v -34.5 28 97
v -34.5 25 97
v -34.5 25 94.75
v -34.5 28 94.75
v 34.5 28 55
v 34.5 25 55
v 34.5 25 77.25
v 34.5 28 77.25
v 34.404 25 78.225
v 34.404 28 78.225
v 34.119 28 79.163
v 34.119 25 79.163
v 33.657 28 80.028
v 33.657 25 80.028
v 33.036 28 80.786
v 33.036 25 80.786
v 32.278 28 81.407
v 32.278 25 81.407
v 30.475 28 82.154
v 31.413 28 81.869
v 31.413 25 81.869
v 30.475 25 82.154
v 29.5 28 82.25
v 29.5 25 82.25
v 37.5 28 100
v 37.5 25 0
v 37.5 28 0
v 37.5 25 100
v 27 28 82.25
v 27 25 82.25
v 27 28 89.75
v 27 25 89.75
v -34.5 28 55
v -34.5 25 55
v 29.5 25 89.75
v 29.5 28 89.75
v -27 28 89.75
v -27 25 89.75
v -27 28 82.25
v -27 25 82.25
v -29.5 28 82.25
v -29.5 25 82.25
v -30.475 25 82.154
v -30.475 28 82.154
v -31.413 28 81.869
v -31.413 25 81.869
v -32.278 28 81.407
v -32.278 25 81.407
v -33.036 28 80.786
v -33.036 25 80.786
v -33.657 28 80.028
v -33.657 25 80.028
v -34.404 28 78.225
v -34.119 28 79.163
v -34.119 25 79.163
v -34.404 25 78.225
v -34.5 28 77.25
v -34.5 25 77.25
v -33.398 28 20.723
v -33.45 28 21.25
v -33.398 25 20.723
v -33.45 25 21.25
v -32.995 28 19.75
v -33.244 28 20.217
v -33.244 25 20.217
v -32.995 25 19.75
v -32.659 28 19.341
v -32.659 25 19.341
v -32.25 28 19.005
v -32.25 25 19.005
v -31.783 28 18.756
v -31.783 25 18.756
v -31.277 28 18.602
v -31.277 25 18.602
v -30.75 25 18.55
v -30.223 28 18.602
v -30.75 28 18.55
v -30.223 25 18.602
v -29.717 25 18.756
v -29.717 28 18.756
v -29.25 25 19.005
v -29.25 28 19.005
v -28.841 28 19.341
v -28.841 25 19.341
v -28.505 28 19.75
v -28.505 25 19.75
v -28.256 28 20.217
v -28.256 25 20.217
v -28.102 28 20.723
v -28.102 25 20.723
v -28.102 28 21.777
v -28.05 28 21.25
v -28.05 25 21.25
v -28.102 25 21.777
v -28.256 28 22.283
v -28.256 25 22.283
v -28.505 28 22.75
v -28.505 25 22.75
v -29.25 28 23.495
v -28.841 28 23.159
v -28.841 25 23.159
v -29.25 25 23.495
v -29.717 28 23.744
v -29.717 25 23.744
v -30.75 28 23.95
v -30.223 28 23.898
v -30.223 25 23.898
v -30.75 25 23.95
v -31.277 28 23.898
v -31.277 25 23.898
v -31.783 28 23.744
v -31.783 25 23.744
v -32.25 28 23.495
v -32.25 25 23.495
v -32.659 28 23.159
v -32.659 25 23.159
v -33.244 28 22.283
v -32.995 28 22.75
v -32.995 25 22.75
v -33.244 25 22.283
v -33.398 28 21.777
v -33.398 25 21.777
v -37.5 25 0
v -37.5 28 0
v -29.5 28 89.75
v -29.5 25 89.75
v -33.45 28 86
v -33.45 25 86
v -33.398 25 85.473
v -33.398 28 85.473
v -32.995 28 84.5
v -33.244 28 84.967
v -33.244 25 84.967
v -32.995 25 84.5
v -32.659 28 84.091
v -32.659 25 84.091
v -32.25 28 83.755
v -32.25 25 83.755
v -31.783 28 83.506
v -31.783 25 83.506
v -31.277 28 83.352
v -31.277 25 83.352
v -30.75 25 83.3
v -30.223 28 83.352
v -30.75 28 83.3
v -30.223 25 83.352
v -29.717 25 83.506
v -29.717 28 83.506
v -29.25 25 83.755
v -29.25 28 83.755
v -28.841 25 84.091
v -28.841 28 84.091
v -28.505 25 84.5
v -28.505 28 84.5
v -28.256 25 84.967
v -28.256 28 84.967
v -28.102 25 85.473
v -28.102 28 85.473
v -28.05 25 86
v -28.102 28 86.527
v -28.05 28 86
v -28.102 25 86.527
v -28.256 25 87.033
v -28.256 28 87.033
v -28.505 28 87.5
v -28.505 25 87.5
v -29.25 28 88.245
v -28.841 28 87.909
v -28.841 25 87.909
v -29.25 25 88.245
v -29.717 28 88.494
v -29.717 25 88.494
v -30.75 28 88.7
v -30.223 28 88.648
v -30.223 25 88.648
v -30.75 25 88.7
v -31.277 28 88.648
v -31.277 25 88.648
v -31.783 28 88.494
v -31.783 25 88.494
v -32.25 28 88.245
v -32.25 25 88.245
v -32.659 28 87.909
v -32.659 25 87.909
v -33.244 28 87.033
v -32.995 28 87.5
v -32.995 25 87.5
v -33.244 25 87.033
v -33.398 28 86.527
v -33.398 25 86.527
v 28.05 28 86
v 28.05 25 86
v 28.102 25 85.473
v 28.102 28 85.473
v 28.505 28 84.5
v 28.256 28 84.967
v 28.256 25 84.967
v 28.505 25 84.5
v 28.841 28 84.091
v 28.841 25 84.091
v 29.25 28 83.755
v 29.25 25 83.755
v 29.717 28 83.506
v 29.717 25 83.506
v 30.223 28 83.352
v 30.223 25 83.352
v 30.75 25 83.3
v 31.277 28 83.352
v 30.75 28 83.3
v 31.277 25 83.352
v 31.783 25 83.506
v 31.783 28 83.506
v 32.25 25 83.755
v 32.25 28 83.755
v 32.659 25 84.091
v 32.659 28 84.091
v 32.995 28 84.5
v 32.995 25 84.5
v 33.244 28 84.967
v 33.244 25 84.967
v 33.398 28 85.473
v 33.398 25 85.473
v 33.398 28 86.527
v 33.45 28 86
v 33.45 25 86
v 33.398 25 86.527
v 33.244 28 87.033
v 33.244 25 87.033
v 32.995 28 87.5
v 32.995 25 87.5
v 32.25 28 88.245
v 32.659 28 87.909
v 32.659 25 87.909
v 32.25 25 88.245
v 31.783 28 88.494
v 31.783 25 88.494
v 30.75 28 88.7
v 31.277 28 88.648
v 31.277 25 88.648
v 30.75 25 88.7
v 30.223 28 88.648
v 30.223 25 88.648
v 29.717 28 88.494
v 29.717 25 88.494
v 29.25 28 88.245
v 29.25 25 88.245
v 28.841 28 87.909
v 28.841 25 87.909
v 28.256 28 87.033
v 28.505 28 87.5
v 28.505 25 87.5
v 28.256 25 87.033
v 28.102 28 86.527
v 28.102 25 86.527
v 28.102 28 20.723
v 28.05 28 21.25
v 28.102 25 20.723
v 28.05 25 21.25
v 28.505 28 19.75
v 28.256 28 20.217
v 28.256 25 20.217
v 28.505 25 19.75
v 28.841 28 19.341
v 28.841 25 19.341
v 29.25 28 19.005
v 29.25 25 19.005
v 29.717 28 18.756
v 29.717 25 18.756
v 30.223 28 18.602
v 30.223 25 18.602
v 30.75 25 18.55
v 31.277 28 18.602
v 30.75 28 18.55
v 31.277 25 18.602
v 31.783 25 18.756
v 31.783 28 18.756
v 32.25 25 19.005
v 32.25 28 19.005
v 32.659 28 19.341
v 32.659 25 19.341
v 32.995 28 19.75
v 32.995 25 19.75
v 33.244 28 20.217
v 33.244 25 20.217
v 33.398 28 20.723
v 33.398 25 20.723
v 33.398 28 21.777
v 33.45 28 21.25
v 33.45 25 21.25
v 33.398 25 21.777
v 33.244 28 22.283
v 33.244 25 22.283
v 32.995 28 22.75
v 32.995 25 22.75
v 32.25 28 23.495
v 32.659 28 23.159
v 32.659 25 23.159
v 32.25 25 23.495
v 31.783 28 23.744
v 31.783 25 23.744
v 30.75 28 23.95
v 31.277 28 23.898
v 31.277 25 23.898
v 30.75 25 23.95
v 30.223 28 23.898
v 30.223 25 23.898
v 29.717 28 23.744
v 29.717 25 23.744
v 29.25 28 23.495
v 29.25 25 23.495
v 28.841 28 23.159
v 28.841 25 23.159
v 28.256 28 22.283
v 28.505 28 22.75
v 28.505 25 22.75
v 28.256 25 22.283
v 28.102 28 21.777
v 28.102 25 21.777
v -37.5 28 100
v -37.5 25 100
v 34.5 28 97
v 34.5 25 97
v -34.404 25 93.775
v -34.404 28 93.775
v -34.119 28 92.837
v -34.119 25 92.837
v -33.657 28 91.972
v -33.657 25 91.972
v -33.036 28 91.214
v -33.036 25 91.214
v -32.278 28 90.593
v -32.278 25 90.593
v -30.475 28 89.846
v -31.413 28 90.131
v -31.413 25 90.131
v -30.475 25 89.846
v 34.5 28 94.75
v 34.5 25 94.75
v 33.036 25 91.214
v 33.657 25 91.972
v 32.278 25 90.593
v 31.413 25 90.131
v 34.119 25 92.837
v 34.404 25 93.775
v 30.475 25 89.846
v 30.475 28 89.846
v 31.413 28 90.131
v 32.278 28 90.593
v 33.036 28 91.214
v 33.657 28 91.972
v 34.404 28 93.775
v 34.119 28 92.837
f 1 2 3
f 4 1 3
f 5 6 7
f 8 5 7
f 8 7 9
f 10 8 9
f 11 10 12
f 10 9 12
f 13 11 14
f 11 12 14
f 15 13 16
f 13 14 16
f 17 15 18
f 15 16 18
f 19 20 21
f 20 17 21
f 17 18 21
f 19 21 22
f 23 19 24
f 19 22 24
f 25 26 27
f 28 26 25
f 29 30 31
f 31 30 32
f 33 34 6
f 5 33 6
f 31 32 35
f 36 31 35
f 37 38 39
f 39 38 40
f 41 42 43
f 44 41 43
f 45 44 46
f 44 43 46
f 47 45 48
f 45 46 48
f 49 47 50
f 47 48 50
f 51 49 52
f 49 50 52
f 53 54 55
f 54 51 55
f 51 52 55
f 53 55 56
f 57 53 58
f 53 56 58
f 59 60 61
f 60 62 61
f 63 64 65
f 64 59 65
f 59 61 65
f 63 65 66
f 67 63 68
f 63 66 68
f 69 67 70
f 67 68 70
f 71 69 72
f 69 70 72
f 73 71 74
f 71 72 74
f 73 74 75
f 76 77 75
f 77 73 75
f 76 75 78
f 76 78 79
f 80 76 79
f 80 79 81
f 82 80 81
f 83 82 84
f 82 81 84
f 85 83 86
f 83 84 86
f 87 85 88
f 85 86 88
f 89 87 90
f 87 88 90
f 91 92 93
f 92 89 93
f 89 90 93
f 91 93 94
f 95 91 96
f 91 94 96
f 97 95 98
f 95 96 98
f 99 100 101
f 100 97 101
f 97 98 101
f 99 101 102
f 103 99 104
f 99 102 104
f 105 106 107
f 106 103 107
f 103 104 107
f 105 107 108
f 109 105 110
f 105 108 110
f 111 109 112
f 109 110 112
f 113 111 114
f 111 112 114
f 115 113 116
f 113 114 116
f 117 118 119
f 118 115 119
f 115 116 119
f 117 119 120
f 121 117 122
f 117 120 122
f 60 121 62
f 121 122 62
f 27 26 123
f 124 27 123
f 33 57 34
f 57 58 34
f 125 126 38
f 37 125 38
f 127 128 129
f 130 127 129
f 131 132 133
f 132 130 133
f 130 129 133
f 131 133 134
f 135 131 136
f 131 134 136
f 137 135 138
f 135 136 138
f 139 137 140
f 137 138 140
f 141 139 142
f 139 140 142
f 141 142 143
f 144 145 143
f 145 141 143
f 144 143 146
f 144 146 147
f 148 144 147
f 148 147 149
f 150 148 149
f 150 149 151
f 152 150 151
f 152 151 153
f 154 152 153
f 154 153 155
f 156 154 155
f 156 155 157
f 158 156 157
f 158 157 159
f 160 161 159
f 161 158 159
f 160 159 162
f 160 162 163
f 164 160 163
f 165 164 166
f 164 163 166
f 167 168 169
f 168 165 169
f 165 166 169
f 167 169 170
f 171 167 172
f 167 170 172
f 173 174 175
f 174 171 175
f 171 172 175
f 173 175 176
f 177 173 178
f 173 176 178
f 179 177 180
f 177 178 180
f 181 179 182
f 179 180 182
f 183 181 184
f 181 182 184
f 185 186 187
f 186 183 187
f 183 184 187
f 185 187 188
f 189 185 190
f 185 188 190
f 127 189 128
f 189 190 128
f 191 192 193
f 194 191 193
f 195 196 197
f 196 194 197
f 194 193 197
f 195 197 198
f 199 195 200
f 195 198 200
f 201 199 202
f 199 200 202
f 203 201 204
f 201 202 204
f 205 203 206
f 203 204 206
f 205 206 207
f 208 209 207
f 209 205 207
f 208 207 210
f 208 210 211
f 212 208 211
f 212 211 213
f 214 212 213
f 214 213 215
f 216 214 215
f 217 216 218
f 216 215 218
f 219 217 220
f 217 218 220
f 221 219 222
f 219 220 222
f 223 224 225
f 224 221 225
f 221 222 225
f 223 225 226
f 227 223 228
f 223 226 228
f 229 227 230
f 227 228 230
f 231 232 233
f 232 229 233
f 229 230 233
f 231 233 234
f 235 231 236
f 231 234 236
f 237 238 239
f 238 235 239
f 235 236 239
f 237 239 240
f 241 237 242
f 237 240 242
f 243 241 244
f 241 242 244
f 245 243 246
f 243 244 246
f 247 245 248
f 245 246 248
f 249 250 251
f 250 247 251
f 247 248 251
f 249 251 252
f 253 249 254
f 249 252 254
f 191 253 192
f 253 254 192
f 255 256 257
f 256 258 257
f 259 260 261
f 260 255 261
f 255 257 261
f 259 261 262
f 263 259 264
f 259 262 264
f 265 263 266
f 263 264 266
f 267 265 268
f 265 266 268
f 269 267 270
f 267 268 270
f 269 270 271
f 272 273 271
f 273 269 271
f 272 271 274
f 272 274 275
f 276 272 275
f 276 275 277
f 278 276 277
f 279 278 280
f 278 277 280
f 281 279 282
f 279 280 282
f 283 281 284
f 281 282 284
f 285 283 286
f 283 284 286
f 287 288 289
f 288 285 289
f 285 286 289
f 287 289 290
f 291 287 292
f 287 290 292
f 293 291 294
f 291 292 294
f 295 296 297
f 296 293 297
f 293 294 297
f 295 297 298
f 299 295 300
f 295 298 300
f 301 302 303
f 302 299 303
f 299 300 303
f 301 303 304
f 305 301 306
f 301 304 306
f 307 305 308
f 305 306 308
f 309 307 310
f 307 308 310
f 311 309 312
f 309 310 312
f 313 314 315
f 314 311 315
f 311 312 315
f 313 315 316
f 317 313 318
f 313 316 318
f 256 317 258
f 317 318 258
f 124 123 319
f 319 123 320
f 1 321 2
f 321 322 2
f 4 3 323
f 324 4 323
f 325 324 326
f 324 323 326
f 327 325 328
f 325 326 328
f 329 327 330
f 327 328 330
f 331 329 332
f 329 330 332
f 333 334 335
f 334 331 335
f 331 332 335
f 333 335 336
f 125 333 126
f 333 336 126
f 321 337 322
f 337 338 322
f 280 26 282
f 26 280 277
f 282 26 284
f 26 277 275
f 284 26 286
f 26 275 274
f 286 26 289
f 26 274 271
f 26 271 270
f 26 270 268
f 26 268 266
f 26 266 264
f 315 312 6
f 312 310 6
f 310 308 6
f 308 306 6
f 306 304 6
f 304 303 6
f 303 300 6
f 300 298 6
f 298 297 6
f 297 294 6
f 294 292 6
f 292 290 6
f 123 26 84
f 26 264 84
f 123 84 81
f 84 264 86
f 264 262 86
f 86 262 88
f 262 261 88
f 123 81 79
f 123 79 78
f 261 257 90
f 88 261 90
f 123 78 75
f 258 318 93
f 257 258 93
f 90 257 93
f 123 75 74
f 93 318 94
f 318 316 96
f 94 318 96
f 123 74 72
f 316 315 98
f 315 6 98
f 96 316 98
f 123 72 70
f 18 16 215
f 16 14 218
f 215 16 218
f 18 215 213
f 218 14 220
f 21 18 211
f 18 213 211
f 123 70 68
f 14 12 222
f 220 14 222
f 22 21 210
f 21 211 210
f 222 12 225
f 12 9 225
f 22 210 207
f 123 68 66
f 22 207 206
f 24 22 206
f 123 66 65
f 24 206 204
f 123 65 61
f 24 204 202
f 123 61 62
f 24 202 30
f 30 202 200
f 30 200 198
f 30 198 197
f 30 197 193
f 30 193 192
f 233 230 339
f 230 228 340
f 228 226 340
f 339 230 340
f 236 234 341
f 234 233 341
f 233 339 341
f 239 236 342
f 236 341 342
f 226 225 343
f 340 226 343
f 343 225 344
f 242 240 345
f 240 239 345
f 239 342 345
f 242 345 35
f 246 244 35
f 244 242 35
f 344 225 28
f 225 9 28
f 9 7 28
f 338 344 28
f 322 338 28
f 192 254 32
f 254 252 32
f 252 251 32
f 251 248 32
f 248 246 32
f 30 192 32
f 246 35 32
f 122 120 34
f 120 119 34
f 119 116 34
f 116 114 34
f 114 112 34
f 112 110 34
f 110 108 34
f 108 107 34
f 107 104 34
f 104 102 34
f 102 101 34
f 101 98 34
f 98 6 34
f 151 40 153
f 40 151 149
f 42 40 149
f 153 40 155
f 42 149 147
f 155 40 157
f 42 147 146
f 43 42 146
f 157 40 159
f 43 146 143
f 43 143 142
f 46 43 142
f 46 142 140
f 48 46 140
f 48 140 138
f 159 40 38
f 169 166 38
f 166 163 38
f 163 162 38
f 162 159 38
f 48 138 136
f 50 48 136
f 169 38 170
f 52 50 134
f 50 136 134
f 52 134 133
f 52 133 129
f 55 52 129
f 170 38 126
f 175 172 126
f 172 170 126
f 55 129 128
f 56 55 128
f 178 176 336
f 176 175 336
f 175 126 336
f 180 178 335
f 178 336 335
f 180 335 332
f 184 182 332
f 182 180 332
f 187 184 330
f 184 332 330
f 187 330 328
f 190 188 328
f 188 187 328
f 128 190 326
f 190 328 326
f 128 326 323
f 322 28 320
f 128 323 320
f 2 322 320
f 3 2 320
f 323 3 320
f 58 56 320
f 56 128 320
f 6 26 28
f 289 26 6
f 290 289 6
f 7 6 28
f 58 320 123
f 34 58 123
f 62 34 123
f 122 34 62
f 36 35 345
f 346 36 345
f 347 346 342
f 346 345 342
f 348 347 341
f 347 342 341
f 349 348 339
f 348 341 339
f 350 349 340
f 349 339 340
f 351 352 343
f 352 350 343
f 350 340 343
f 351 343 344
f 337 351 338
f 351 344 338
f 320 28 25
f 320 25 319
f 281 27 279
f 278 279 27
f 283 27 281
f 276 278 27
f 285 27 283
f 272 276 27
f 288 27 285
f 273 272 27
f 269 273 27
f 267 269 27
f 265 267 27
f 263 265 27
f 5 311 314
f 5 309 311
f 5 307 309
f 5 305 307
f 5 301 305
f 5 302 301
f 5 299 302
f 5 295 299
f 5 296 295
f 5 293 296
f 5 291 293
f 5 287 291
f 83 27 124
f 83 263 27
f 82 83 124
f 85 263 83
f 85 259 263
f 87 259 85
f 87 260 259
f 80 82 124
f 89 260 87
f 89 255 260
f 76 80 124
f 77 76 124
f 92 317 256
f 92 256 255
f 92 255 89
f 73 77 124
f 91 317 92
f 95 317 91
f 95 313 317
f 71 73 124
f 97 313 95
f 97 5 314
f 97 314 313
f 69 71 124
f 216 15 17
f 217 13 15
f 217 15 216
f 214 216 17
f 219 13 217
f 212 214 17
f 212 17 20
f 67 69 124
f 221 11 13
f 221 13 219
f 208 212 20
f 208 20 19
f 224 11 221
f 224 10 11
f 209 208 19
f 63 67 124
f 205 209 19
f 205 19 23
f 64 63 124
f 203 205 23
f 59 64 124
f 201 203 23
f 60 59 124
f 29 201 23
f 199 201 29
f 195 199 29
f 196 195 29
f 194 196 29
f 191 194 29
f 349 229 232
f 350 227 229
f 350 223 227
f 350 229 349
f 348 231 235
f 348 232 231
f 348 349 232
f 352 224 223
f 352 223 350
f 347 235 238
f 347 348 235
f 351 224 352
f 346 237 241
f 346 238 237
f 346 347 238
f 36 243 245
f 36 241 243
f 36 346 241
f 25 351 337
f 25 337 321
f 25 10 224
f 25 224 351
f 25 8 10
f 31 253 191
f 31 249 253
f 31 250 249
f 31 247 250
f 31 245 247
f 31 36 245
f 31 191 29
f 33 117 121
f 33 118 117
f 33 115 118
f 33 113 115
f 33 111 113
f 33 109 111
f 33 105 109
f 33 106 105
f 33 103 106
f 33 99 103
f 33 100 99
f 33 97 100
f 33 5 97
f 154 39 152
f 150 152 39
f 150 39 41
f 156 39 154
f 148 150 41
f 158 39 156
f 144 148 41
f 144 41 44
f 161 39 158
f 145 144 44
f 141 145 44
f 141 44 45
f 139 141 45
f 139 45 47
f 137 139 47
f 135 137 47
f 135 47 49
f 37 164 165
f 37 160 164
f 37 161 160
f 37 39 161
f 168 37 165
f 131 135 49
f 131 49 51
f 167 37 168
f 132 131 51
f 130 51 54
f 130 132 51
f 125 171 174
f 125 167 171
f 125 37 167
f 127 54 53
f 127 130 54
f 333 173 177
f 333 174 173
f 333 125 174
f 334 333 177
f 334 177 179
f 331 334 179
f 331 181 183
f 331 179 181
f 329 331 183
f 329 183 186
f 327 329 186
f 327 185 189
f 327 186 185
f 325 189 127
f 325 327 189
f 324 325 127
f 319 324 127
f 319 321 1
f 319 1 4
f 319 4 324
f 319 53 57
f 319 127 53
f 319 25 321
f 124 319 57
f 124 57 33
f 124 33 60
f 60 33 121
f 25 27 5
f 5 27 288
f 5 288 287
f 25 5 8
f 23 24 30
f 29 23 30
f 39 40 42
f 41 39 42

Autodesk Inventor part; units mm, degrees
ref_plane "YZ Plane" through (0, 0, 0) normal (1, 0, 0) x (0, 1, 0)
ref_plane "XZ Plane" through (0, 0, 0) normal (0, 1, 0) x (-1, 0, 0)
ref_plane "Work Plane1" through (37.5, 25, 0) normal (0, 1, 0) x (-1, 0, 0)
sketch "Sketch1" plane through (37.5, 25, 0) normal (0, 1, 0) x (-1, 0, 0)
  line L0 (0, 0) -> (75, 0) projected
  line L1 (75, 0) -> (75, 100) projected
  line L2 (0, 100) -> (75, 100) projected
  line L3 (0, 0) -> (0, 100) projected
  circle A0 centre (6.75, 86) radius 2.7 projected
  circle A1 centre (68.25, 86) radius 2.7 projected
  circle A2 centre (68.25, 21.25) radius 2.7 projected
  circle A3 centre (6.75, 21.25) radius 2.7 projected
  line L4 (3, 3) -> (3, 17.5) projected
  line L5 (3, 17.5) -> (10.5, 17.5) projected
  line L6 (10.5, 17.5) -> (10.5, 25) projected
  line L7 (10.5, 25) -> (3, 25) projected
  line L8 (3, 25) -> (3, 77.25) projected
  arc A4 (8, 82.25) -> (3, 77.25) centre (8, 77.25) ccw projected
  line L9 (8, 82.25) -> (10.5, 82.25) projected
  line L10 (10.5, 82.25) -> (10.5, 89.75) projected
  line L11 (10.5, 89.75) -> (8, 89.75) projected
  arc A5 (3, 94.75) -> (8, 89.75) centre (8, 94.75) ccw projected
  line L12 (3, 94.75) -> (3, 97) projected
  line L13 (3, 97) -> (72, 97) projected
  line L14 (72, 97) -> (72, 94.75) projected
  arc A6 (67, 89.75) -> (72, 94.75) centre (67, 94.75) ccw projected
  line L15 (67, 89.75) -> (64.5, 89.75) projected
  line L16 (64.5, 89.75) -> (64.5, 82.25) projected
  line L17 (64.5, 82.25) -> (67, 82.25) projected
  arc A7 (72, 77.25) -> (67, 82.25) centre (67, 77.25) ccw projected
  line L18 (72, 77.25) -> (72, 25) projected
  line L19 (72, 25) -> (64.5, 25) projected
  line L20 (64.5, 25) -> (64.5, 17.5) projected
  line L21 (64.5, 17.5) -> (72, 17.5) projected
  line L22 (72, 17.5) -> (72, 3) projected
  line L23 (72, 3) -> (3, 3) projected
  line L24 (72, 55) -> (3, 55)
  point P0 (37.5, 0)
  dimension "d0" = 42
extrude "Extrusion1" add sketch "Sketch1" along normal blind 3 contours L3 L2 L1 L0 | L4 L5 L6 L7 L8 L24 L18 L19 L20 L21 L22 L23
properties part number "plytka"
